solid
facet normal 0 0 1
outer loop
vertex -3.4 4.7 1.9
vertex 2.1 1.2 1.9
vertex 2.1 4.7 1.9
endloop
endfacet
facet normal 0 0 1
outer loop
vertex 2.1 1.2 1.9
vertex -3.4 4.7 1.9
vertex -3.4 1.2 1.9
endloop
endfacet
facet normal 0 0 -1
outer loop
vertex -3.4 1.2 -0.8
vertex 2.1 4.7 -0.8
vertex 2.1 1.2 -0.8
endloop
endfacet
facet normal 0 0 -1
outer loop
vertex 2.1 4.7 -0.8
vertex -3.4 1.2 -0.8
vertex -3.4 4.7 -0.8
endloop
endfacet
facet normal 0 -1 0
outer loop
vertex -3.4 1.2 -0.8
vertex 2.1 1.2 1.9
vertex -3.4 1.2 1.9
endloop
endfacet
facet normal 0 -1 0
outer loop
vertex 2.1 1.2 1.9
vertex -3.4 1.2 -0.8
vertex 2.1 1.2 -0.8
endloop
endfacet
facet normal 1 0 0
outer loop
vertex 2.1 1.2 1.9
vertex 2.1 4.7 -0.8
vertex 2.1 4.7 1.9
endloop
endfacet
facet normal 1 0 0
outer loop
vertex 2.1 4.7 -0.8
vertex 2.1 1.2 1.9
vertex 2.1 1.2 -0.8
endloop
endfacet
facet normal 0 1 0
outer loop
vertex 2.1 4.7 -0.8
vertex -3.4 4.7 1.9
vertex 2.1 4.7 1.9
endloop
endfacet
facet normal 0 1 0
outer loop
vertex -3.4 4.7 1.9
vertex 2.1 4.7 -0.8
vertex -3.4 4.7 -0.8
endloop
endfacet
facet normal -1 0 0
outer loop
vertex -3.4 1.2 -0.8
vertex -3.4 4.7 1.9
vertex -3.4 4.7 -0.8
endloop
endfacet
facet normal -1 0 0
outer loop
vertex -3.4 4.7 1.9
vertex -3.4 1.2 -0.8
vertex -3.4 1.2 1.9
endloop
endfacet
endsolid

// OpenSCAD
union() {
  translate([-3.4, 1.2, -0.8]) cube(size=[5.5,3.5,2.7], center=false);
}
